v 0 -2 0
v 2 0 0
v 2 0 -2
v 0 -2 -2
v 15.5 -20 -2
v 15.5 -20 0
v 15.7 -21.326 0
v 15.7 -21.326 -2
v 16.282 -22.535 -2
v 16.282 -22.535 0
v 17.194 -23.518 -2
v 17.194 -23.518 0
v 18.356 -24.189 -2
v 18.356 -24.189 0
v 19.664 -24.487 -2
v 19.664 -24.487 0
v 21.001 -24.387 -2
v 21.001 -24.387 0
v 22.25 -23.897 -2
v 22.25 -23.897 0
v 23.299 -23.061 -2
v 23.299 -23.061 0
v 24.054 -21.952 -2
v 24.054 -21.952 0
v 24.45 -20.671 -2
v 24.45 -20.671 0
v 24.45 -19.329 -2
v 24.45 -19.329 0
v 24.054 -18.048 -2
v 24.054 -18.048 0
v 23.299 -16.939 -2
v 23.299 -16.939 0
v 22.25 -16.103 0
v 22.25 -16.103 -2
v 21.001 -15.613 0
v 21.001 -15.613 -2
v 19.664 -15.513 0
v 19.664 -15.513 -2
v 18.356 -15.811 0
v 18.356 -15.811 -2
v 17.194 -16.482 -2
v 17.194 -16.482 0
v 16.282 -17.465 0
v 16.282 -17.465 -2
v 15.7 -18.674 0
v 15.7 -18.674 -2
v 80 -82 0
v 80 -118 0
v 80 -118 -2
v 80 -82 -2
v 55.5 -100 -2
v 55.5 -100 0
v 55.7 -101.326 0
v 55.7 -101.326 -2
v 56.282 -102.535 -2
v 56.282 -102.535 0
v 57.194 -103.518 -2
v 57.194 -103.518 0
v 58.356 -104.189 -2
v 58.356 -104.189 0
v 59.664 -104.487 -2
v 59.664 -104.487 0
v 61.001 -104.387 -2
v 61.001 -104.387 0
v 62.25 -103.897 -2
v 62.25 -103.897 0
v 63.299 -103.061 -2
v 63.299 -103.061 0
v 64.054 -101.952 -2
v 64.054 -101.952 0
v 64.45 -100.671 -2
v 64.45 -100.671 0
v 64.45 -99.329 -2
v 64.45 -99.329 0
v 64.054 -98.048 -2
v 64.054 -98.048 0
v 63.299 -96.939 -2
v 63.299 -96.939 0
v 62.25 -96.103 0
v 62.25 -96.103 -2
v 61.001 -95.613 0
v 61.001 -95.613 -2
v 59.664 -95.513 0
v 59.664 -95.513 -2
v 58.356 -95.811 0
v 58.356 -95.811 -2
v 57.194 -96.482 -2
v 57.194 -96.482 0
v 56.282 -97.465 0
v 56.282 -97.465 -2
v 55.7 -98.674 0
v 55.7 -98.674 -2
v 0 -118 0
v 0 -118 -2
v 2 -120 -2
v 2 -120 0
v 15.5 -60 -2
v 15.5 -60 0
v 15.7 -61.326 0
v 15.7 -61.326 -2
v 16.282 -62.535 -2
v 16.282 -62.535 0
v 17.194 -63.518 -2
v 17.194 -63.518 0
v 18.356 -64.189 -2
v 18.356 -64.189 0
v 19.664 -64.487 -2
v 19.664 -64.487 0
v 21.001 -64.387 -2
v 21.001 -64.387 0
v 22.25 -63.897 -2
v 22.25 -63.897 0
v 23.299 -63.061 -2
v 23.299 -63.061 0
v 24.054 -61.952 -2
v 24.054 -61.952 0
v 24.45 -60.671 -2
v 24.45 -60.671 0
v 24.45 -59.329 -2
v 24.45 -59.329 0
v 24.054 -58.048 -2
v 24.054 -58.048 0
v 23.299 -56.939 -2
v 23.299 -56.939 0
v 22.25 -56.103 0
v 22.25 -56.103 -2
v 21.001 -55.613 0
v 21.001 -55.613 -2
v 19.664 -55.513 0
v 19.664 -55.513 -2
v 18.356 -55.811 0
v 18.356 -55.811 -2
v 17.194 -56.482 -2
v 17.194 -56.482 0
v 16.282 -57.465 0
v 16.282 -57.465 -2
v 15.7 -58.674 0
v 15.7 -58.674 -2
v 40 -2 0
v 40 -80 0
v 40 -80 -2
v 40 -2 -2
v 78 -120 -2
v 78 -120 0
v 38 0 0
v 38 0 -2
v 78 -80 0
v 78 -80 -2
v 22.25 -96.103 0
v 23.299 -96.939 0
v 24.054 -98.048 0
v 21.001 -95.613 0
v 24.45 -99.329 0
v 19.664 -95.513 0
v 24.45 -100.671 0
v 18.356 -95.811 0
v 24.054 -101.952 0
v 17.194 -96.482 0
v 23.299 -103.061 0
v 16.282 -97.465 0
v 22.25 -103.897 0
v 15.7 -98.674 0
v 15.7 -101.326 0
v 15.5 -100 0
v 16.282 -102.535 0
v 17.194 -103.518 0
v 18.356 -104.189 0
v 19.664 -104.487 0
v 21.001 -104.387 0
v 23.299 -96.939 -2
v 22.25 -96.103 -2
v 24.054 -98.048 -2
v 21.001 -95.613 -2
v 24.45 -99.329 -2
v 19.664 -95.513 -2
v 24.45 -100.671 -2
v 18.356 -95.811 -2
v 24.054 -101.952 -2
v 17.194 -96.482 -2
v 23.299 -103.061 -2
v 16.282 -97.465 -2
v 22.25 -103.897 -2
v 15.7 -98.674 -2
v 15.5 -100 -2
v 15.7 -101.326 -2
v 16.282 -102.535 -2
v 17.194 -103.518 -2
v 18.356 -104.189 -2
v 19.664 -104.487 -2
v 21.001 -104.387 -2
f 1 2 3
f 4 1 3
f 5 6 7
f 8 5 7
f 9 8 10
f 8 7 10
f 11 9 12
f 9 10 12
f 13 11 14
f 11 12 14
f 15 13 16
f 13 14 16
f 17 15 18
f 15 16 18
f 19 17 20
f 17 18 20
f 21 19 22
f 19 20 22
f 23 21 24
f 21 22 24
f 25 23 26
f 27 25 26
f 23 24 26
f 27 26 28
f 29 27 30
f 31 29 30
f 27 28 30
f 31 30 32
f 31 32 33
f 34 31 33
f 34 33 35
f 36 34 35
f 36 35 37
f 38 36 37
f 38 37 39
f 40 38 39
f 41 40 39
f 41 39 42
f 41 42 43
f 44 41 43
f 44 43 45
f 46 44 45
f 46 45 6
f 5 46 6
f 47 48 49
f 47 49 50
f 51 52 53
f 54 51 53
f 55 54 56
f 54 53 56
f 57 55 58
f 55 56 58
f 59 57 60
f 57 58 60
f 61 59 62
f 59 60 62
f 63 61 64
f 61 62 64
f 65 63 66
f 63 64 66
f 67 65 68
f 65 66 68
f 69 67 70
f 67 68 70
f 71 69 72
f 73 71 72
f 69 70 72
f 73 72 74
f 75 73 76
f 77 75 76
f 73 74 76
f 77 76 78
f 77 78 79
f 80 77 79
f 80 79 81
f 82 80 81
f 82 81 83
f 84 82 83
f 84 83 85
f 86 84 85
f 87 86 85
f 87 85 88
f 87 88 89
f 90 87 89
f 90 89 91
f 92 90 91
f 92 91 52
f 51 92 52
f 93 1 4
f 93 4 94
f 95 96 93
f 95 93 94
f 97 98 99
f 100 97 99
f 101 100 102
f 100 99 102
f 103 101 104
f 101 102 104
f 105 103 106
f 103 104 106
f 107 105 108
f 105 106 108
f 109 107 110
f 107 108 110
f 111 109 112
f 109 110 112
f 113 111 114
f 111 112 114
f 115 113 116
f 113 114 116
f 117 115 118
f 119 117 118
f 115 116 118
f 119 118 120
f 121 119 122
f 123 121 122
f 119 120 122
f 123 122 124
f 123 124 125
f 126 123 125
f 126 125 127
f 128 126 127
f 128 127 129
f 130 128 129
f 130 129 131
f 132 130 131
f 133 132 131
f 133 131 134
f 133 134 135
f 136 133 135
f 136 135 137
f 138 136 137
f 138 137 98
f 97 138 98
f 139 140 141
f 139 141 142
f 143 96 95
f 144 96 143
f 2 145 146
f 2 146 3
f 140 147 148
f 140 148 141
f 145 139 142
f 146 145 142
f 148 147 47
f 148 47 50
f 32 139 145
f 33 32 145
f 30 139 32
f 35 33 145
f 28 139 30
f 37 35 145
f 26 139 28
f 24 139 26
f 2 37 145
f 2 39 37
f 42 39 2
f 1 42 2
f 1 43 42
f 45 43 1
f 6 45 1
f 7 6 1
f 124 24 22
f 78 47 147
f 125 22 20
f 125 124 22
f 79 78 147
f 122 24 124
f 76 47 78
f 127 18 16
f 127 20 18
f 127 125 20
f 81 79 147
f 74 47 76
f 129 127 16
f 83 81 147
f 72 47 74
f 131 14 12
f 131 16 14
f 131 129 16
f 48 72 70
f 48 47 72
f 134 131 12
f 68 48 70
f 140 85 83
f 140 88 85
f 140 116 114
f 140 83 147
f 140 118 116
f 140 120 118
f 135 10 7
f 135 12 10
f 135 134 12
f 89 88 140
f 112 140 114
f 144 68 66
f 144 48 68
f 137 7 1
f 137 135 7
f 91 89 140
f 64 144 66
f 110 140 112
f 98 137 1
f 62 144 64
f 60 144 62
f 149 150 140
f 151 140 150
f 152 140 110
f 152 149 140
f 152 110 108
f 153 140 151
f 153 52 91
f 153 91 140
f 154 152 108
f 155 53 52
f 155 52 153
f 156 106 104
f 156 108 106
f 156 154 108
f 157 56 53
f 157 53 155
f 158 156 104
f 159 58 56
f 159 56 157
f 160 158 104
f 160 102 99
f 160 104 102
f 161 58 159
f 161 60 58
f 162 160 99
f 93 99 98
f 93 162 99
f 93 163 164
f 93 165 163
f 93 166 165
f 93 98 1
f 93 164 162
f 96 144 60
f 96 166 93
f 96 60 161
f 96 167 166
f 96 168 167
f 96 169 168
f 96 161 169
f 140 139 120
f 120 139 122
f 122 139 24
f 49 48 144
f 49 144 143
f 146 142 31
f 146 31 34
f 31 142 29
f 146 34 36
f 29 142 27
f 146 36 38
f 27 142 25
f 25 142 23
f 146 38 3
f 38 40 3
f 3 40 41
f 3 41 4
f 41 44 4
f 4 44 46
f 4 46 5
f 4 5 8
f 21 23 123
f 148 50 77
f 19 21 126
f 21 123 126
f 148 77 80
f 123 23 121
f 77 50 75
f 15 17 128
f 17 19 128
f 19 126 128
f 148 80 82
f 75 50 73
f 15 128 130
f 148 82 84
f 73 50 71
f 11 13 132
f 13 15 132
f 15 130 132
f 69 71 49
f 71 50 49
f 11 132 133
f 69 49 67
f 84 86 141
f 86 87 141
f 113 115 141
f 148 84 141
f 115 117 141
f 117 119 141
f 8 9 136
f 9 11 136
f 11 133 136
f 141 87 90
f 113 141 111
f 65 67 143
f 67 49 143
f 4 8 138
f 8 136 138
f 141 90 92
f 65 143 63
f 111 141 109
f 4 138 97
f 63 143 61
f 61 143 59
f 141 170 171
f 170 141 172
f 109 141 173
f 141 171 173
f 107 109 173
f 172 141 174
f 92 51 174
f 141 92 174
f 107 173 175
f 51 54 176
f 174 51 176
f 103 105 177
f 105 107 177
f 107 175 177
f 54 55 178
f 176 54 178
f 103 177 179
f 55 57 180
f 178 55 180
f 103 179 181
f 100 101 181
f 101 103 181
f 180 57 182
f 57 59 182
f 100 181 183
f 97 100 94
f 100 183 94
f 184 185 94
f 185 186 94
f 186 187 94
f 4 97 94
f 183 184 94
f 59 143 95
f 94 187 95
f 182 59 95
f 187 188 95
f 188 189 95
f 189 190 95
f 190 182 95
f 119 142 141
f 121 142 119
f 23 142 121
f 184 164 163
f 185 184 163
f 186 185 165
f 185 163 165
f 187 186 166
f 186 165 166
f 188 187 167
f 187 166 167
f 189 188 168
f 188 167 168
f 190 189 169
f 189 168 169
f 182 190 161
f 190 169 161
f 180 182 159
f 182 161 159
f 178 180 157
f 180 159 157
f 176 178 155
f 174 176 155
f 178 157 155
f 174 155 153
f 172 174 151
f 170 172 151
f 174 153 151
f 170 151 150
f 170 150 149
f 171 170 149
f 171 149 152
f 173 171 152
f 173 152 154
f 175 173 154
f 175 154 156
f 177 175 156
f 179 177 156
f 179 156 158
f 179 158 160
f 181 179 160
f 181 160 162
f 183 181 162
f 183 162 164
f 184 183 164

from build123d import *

# Parameters (mm, degrees)
EXTRUDE_1_DEPTH   = 2
HOLE_WIZARD_M81_D = 9
CHAMFER_1_SIZE    = 2


with BuildPart() as part:
    # Эскиз1 → Бобышка-Вытянуть1 (new body)
    with BuildSketch(Plane(origin=(0, 0, 0), x_dir=(1, 0, 0), z_dir=(0, 0, -1))):
        Polygon((0, 0), (0, 120), (80, 120), (80, 80), (40, 80), (40, 0), align=None)
    extrude(amount=EXTRUDE_1_DEPTH)

    # Отверстие с зазором M81 (through all)
    with Locations(Plane(origin=(0, 0, -2), x_dir=(1, 0, 0), z_dir=(0, 0, -1))):
        with Locations((60, 100), (20, 100), (20, 60), (20, 20)):
            Hole(HOLE_WIZARD_M81_D / 2)

    # Фаска1
    chamfer_1_edges = [part.edges().sort_by_distance(p)[0] for p in [
        (0, 0, -1),
        (0, -120, -1),
        (80, -120, -1),
        (80, -80, -1),
        (40, 0, -1),
    ]]
    chamfer(chamfer_1_edges, length=CHAMFER_1_SIZE)


solid = part.part
